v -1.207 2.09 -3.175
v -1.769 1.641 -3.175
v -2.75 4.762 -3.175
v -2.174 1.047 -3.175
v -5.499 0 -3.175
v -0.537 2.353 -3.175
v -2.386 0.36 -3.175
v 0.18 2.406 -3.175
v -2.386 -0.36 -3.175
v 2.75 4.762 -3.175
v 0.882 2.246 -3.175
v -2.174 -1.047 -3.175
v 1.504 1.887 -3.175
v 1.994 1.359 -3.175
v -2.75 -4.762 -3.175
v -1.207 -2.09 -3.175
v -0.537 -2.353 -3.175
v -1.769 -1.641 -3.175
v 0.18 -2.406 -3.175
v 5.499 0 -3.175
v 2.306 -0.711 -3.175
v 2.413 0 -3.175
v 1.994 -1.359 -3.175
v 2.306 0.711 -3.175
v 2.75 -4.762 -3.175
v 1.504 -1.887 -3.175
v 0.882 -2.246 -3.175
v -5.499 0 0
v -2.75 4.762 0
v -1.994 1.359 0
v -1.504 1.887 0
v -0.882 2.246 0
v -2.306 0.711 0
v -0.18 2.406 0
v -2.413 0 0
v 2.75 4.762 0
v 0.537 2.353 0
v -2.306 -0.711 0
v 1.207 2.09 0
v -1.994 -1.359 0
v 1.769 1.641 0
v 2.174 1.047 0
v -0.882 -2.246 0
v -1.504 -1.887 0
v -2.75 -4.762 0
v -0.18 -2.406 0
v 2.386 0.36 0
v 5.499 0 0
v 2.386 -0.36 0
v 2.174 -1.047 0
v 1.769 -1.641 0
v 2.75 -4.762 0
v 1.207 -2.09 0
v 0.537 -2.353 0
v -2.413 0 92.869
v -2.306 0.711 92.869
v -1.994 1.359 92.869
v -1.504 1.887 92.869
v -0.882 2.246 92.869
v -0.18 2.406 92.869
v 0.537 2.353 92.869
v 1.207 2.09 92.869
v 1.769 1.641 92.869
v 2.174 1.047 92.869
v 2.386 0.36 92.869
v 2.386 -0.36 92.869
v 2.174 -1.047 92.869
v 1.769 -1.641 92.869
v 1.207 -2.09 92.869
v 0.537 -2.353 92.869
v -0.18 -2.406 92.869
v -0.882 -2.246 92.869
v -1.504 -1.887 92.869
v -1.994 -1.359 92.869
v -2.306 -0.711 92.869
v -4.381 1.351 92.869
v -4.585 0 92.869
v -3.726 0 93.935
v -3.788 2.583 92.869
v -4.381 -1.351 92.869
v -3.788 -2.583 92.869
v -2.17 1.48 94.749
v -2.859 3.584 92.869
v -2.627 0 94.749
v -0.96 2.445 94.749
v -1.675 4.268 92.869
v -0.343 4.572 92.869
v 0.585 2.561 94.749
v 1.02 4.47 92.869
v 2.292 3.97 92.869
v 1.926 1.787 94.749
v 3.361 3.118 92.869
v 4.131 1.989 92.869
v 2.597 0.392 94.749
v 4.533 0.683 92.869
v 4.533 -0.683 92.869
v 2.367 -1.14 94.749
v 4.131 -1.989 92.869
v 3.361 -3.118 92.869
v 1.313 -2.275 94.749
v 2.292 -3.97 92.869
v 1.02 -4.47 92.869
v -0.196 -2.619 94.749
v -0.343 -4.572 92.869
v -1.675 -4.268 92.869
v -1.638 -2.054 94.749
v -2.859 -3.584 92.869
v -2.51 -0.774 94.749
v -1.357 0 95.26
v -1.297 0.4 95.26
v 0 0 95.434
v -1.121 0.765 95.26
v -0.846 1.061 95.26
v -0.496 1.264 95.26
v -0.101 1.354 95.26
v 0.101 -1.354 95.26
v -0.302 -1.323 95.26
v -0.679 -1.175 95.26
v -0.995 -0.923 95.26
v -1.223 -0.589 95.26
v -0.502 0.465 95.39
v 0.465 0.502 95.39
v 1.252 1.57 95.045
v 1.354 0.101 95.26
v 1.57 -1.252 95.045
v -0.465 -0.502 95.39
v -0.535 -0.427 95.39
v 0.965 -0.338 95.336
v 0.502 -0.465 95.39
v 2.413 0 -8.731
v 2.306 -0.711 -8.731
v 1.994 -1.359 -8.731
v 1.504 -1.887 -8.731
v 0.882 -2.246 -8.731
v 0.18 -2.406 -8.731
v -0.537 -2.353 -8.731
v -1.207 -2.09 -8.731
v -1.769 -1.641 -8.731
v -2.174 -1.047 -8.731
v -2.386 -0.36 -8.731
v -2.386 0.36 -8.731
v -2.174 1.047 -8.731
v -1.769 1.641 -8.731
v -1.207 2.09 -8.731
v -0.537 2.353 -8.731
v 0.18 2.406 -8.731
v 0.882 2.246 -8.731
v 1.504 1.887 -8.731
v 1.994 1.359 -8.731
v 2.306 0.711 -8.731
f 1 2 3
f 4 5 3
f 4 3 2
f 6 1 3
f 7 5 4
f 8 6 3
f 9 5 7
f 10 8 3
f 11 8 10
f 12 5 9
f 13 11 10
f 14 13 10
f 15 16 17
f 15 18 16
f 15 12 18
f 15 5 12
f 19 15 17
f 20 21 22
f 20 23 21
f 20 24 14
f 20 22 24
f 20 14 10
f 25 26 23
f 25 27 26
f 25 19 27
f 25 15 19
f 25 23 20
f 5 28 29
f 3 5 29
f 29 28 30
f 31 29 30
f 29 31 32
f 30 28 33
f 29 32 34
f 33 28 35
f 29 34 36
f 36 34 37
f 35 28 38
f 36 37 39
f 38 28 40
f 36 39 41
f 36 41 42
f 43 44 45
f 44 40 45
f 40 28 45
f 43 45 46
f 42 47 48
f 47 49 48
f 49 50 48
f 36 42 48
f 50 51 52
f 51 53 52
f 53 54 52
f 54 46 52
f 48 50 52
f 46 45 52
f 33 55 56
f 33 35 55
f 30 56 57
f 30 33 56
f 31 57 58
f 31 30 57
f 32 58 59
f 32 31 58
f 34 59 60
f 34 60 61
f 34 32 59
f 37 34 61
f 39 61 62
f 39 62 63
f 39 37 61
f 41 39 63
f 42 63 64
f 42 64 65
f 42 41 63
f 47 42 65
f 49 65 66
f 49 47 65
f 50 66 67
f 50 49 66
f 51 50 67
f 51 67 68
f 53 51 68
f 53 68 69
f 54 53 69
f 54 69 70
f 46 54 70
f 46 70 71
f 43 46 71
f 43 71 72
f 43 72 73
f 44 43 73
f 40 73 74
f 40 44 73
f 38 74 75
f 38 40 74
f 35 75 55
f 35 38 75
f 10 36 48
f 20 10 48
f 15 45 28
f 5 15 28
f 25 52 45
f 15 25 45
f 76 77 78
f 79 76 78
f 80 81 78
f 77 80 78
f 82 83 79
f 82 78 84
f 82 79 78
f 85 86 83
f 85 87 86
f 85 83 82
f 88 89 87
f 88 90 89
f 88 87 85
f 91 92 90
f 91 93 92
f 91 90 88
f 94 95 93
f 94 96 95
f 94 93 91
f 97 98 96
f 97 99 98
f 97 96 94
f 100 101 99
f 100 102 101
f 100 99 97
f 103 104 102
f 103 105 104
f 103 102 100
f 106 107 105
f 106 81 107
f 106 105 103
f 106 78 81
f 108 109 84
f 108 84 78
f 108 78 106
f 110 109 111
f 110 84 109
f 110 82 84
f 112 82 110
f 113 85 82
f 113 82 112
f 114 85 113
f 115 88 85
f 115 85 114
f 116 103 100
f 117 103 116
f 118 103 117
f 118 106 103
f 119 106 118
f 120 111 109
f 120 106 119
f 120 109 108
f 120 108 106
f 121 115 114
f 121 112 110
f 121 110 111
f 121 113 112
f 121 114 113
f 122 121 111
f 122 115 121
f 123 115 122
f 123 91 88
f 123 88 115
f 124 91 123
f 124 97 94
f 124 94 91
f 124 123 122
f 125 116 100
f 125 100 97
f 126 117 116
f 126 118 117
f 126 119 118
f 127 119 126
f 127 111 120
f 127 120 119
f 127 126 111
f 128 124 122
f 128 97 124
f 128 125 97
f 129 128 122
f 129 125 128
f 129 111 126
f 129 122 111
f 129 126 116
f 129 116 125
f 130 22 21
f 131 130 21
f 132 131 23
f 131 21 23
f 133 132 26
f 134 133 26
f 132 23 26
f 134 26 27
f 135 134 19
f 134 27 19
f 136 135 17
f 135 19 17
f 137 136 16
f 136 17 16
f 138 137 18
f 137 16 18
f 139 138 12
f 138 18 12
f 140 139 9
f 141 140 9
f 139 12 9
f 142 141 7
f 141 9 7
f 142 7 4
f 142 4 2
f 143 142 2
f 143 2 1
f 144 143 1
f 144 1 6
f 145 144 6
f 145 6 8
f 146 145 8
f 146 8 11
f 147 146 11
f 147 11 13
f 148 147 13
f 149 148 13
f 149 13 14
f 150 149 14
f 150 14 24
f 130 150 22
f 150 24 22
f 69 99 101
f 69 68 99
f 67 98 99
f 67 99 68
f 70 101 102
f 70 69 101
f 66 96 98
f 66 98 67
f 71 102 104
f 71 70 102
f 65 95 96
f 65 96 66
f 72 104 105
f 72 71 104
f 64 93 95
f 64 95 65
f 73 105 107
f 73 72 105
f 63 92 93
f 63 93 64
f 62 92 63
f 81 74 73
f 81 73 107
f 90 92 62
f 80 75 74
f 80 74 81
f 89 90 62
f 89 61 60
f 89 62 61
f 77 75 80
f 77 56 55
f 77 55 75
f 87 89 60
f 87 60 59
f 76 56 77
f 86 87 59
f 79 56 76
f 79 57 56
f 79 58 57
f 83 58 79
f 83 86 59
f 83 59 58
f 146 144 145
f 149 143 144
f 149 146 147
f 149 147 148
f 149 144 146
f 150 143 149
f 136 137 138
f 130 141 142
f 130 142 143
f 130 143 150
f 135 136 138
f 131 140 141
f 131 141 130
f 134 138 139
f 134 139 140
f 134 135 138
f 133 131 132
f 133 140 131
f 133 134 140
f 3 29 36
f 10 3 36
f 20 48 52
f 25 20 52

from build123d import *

# Parameters (mm, degrees)
F3_DEPTH = 3.175
F4_R     = 2.413
F5_DEPTH = 5.55625


with BuildPart() as f1:
    # F0 (on Front) → F1 (revolve)
    with BuildSketch(Plane.XZ):
        with BuildLine():
            Line((0, 0), (0, 92.86875))
            Line((0, 92.86875), (0, 95.43415))
            ThreePointArc((0, 95.43415), (-2.626821, 94.749192), (-4.5847, 92.86875))
            Line((-4.5847, 92.86875), (-2.413, 92.86875))
            Line((-2.413, 92.86875), (-2.413, 0))
            Line((-2.413, 0), (0, 0))
        make_face()
    revolve(axis=Axis((0, 0, 46.434375), (0, 0, -1)))

    # F2 (on face) → F3 (join)
    with BuildSketch(Plane(origin=(0, 0, 0), x_dir=(1, 0, 0), z_dir=(0, 0, -1))):
        Polygon((2.749631, 4.7625), (-2.749631, 4.7625), (-5.499261, 0), (-2.749631, -4.7625), (2.749631, -4.7625), (5.499261, 0), align=None)
    extrude(amount=F3_DEPTH)

    # F4 (on face) → F5 (join)
    with BuildSketch(Plane(origin=(0, 0, -3.175), x_dir=(1, 0, 0), z_dir=(0, 0, -1))):
        Circle(F4_R)
    extrude(amount=F5_DEPTH)


solid = f1.part
